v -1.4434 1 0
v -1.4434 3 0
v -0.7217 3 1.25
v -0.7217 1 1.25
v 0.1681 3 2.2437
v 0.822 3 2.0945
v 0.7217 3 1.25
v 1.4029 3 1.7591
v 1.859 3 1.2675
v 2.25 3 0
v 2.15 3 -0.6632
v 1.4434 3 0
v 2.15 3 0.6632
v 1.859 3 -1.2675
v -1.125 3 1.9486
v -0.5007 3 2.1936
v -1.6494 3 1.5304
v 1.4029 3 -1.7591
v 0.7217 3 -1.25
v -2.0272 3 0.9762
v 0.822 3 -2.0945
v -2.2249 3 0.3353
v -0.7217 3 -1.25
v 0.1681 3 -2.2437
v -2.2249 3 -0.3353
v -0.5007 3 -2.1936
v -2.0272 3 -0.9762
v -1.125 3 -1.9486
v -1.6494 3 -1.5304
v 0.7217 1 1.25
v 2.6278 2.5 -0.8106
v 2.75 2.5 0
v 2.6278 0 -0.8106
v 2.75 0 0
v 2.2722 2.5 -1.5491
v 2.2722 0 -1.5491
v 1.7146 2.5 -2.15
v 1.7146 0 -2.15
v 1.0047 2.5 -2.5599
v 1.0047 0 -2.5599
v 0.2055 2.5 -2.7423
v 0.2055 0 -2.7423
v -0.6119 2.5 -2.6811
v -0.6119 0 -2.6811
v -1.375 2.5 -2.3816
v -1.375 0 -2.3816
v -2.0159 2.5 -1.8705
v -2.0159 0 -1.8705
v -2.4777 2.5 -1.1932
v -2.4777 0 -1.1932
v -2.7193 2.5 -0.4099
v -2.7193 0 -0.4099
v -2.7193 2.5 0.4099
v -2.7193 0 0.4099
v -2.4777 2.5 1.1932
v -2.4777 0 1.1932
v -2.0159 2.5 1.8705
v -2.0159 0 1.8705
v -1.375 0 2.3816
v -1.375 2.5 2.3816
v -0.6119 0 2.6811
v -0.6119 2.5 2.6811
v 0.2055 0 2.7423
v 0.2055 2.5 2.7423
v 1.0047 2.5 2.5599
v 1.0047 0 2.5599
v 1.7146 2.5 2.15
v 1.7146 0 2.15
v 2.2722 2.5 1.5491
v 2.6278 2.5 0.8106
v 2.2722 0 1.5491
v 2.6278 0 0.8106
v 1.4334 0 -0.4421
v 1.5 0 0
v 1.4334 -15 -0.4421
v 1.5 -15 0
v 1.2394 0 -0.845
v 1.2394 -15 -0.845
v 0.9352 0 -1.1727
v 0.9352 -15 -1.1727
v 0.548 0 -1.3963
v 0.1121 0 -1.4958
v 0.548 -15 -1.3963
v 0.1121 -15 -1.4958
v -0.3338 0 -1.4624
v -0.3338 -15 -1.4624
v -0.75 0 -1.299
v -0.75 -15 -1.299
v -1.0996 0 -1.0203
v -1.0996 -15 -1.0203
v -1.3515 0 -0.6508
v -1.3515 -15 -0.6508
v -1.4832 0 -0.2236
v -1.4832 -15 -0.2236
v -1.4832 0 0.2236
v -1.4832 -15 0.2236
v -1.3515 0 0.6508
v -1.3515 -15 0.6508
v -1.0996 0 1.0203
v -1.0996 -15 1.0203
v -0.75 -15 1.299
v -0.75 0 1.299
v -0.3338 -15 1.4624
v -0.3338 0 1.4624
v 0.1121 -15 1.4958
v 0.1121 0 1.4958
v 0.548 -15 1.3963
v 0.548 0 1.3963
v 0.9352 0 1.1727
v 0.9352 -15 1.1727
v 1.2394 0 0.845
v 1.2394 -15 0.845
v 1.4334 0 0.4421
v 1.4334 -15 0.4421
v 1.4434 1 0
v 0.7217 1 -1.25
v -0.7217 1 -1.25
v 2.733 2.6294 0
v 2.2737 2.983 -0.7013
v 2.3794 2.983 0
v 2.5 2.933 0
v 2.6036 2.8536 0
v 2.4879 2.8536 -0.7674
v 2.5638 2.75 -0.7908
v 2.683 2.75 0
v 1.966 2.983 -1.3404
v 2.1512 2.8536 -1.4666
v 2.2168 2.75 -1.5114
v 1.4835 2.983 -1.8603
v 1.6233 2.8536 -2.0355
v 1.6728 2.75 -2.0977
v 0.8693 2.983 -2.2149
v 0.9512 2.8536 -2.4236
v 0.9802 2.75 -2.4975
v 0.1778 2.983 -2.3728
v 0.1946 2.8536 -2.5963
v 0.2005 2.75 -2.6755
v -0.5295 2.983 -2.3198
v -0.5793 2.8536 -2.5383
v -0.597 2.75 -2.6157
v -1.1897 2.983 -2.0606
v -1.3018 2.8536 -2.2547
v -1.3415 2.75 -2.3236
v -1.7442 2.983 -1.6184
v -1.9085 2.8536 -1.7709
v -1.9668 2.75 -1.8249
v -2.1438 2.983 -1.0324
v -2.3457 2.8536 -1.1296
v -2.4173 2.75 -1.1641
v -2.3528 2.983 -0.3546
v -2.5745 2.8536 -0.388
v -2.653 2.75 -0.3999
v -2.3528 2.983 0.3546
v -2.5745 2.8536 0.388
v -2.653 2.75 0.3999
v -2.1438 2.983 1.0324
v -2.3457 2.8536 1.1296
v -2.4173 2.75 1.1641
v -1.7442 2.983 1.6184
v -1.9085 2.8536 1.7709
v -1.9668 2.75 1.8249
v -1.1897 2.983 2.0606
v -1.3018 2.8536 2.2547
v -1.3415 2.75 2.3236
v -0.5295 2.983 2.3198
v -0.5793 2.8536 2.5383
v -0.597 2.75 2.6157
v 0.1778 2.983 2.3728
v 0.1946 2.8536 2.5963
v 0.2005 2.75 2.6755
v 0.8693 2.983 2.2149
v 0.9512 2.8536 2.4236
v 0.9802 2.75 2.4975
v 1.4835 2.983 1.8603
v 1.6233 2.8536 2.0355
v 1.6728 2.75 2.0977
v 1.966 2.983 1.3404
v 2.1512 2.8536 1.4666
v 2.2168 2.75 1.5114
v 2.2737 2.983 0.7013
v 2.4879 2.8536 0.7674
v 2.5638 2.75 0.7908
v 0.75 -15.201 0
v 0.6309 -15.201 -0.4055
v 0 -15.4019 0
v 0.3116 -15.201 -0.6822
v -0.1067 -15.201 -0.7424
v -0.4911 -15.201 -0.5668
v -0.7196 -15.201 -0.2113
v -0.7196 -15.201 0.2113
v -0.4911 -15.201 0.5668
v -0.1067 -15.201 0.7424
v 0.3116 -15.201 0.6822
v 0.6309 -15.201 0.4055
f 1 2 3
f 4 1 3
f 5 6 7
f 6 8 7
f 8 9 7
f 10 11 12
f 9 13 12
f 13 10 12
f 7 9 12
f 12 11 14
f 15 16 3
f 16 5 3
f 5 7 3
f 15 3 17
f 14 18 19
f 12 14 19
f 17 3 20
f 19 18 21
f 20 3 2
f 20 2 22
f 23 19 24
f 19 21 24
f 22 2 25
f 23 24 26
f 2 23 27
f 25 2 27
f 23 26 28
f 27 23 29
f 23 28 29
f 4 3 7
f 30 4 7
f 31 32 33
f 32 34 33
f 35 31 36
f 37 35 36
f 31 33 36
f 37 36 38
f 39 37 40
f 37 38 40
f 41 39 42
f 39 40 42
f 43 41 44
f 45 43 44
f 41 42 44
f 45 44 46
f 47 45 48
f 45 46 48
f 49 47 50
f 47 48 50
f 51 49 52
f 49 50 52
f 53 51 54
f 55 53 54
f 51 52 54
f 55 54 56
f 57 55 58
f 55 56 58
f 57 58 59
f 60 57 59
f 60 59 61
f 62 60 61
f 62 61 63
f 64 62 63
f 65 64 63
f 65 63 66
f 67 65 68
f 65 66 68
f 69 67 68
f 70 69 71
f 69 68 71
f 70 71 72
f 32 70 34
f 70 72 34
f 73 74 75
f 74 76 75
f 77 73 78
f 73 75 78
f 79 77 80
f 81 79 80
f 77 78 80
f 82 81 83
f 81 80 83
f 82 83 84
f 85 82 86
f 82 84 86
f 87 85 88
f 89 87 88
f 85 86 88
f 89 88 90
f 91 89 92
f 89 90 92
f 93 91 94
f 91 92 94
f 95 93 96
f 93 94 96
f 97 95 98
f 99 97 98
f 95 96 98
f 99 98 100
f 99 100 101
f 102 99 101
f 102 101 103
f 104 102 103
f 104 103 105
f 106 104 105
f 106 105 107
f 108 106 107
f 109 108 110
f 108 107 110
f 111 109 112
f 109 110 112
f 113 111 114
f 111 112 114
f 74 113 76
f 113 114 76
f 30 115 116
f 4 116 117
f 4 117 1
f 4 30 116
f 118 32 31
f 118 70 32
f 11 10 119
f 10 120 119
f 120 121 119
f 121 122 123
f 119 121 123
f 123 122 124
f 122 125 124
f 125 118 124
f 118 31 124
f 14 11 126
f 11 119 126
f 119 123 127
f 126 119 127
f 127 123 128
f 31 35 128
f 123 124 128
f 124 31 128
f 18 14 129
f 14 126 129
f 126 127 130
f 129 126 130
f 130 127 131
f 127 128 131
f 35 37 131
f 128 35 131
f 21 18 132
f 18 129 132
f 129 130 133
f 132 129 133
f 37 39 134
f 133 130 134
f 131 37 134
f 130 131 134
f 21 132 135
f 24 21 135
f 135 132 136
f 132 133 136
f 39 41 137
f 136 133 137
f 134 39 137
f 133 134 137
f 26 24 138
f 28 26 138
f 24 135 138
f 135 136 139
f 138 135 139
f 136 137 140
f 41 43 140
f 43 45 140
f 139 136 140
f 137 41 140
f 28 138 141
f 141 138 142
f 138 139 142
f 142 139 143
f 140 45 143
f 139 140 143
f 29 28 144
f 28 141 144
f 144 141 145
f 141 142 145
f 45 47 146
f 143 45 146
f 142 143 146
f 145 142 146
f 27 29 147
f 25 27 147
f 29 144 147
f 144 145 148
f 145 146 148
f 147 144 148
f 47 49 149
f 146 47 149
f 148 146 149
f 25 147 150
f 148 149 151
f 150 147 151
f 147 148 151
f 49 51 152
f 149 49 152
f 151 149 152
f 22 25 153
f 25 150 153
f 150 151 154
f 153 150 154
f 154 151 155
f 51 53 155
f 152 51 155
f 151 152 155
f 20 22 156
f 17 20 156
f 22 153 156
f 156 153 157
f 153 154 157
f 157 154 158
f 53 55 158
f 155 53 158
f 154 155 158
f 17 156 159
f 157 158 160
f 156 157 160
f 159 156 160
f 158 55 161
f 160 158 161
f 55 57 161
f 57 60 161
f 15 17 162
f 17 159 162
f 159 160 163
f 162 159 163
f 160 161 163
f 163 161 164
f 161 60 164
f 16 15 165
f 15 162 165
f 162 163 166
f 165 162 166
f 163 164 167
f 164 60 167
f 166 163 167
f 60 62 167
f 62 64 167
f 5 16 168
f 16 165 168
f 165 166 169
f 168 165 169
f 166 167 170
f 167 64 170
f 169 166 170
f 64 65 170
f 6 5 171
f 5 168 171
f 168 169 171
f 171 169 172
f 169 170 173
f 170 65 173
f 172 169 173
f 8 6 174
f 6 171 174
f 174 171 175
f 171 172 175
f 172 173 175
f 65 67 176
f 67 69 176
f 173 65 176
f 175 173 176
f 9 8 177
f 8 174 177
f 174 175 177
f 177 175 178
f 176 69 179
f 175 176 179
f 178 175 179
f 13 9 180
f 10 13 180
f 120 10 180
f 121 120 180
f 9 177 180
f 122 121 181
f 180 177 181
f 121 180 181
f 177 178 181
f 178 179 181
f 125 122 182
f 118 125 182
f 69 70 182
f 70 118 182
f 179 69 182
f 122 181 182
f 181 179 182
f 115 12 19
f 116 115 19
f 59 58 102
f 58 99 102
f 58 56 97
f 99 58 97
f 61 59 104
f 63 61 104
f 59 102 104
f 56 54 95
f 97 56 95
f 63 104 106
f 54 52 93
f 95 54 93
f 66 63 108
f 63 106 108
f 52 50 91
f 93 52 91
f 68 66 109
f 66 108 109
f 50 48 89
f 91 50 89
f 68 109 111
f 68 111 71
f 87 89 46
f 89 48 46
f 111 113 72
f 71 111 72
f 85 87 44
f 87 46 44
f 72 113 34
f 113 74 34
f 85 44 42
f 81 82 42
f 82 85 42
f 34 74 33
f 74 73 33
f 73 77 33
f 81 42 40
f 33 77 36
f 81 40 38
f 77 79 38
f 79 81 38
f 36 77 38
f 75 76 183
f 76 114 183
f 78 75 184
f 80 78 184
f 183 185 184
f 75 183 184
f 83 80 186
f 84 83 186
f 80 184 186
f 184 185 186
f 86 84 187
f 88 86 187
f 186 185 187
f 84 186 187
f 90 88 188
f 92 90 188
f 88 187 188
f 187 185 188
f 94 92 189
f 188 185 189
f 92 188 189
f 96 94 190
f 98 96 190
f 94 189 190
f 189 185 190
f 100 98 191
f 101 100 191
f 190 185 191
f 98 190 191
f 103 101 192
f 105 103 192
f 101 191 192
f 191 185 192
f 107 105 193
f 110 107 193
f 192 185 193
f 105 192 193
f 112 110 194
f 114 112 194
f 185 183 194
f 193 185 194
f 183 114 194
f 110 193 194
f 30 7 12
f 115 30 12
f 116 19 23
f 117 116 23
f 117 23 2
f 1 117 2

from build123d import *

# Parameters (mm, degrees)
CUT_EXTRUDE1_DEPTH = 2


with BuildPart() as part:
    # Sketch1 → Base-Revolve (revolve)
    with BuildSketch(Plane.XY):
        with BuildLine():
            Line((0, -15.401923789), (0, 3))
            Line((0, 3), (2.25, 3))
            ThreePointArc((2.25, 3), (2.603553391, 2.853553391), (2.75, 2.5))
            Line((2.75, 2.5), (2.75, 0))
            Line((2.75, 0), (1.5, 0))
            Line((1.5, 0), (1.5, -15))
            Line((1.5, -15), (0, -15.401923789))
        make_face()
    revolve(axis=Axis((0, 3, 0), (0, 1, 0)))

    # Sketch2 → Cut-Extrude1 (cut)
    with BuildSketch(Plane(origin=(0, 3, 0), x_dir=(-1, 0, 0), z_dir=(0, 1, 0))):
        Polygon((-1.443375673, 0), (-0.721687836, -1.25), (0.721687836, -1.25), (1.443375673, 0), (0.721687836, 1.25), (-0.721687836, 1.25), align=None)
    extrude(amount=-CUT_EXTRUDE1_DEPTH, mode=Mode.SUBTRACT)


solid = part.part
